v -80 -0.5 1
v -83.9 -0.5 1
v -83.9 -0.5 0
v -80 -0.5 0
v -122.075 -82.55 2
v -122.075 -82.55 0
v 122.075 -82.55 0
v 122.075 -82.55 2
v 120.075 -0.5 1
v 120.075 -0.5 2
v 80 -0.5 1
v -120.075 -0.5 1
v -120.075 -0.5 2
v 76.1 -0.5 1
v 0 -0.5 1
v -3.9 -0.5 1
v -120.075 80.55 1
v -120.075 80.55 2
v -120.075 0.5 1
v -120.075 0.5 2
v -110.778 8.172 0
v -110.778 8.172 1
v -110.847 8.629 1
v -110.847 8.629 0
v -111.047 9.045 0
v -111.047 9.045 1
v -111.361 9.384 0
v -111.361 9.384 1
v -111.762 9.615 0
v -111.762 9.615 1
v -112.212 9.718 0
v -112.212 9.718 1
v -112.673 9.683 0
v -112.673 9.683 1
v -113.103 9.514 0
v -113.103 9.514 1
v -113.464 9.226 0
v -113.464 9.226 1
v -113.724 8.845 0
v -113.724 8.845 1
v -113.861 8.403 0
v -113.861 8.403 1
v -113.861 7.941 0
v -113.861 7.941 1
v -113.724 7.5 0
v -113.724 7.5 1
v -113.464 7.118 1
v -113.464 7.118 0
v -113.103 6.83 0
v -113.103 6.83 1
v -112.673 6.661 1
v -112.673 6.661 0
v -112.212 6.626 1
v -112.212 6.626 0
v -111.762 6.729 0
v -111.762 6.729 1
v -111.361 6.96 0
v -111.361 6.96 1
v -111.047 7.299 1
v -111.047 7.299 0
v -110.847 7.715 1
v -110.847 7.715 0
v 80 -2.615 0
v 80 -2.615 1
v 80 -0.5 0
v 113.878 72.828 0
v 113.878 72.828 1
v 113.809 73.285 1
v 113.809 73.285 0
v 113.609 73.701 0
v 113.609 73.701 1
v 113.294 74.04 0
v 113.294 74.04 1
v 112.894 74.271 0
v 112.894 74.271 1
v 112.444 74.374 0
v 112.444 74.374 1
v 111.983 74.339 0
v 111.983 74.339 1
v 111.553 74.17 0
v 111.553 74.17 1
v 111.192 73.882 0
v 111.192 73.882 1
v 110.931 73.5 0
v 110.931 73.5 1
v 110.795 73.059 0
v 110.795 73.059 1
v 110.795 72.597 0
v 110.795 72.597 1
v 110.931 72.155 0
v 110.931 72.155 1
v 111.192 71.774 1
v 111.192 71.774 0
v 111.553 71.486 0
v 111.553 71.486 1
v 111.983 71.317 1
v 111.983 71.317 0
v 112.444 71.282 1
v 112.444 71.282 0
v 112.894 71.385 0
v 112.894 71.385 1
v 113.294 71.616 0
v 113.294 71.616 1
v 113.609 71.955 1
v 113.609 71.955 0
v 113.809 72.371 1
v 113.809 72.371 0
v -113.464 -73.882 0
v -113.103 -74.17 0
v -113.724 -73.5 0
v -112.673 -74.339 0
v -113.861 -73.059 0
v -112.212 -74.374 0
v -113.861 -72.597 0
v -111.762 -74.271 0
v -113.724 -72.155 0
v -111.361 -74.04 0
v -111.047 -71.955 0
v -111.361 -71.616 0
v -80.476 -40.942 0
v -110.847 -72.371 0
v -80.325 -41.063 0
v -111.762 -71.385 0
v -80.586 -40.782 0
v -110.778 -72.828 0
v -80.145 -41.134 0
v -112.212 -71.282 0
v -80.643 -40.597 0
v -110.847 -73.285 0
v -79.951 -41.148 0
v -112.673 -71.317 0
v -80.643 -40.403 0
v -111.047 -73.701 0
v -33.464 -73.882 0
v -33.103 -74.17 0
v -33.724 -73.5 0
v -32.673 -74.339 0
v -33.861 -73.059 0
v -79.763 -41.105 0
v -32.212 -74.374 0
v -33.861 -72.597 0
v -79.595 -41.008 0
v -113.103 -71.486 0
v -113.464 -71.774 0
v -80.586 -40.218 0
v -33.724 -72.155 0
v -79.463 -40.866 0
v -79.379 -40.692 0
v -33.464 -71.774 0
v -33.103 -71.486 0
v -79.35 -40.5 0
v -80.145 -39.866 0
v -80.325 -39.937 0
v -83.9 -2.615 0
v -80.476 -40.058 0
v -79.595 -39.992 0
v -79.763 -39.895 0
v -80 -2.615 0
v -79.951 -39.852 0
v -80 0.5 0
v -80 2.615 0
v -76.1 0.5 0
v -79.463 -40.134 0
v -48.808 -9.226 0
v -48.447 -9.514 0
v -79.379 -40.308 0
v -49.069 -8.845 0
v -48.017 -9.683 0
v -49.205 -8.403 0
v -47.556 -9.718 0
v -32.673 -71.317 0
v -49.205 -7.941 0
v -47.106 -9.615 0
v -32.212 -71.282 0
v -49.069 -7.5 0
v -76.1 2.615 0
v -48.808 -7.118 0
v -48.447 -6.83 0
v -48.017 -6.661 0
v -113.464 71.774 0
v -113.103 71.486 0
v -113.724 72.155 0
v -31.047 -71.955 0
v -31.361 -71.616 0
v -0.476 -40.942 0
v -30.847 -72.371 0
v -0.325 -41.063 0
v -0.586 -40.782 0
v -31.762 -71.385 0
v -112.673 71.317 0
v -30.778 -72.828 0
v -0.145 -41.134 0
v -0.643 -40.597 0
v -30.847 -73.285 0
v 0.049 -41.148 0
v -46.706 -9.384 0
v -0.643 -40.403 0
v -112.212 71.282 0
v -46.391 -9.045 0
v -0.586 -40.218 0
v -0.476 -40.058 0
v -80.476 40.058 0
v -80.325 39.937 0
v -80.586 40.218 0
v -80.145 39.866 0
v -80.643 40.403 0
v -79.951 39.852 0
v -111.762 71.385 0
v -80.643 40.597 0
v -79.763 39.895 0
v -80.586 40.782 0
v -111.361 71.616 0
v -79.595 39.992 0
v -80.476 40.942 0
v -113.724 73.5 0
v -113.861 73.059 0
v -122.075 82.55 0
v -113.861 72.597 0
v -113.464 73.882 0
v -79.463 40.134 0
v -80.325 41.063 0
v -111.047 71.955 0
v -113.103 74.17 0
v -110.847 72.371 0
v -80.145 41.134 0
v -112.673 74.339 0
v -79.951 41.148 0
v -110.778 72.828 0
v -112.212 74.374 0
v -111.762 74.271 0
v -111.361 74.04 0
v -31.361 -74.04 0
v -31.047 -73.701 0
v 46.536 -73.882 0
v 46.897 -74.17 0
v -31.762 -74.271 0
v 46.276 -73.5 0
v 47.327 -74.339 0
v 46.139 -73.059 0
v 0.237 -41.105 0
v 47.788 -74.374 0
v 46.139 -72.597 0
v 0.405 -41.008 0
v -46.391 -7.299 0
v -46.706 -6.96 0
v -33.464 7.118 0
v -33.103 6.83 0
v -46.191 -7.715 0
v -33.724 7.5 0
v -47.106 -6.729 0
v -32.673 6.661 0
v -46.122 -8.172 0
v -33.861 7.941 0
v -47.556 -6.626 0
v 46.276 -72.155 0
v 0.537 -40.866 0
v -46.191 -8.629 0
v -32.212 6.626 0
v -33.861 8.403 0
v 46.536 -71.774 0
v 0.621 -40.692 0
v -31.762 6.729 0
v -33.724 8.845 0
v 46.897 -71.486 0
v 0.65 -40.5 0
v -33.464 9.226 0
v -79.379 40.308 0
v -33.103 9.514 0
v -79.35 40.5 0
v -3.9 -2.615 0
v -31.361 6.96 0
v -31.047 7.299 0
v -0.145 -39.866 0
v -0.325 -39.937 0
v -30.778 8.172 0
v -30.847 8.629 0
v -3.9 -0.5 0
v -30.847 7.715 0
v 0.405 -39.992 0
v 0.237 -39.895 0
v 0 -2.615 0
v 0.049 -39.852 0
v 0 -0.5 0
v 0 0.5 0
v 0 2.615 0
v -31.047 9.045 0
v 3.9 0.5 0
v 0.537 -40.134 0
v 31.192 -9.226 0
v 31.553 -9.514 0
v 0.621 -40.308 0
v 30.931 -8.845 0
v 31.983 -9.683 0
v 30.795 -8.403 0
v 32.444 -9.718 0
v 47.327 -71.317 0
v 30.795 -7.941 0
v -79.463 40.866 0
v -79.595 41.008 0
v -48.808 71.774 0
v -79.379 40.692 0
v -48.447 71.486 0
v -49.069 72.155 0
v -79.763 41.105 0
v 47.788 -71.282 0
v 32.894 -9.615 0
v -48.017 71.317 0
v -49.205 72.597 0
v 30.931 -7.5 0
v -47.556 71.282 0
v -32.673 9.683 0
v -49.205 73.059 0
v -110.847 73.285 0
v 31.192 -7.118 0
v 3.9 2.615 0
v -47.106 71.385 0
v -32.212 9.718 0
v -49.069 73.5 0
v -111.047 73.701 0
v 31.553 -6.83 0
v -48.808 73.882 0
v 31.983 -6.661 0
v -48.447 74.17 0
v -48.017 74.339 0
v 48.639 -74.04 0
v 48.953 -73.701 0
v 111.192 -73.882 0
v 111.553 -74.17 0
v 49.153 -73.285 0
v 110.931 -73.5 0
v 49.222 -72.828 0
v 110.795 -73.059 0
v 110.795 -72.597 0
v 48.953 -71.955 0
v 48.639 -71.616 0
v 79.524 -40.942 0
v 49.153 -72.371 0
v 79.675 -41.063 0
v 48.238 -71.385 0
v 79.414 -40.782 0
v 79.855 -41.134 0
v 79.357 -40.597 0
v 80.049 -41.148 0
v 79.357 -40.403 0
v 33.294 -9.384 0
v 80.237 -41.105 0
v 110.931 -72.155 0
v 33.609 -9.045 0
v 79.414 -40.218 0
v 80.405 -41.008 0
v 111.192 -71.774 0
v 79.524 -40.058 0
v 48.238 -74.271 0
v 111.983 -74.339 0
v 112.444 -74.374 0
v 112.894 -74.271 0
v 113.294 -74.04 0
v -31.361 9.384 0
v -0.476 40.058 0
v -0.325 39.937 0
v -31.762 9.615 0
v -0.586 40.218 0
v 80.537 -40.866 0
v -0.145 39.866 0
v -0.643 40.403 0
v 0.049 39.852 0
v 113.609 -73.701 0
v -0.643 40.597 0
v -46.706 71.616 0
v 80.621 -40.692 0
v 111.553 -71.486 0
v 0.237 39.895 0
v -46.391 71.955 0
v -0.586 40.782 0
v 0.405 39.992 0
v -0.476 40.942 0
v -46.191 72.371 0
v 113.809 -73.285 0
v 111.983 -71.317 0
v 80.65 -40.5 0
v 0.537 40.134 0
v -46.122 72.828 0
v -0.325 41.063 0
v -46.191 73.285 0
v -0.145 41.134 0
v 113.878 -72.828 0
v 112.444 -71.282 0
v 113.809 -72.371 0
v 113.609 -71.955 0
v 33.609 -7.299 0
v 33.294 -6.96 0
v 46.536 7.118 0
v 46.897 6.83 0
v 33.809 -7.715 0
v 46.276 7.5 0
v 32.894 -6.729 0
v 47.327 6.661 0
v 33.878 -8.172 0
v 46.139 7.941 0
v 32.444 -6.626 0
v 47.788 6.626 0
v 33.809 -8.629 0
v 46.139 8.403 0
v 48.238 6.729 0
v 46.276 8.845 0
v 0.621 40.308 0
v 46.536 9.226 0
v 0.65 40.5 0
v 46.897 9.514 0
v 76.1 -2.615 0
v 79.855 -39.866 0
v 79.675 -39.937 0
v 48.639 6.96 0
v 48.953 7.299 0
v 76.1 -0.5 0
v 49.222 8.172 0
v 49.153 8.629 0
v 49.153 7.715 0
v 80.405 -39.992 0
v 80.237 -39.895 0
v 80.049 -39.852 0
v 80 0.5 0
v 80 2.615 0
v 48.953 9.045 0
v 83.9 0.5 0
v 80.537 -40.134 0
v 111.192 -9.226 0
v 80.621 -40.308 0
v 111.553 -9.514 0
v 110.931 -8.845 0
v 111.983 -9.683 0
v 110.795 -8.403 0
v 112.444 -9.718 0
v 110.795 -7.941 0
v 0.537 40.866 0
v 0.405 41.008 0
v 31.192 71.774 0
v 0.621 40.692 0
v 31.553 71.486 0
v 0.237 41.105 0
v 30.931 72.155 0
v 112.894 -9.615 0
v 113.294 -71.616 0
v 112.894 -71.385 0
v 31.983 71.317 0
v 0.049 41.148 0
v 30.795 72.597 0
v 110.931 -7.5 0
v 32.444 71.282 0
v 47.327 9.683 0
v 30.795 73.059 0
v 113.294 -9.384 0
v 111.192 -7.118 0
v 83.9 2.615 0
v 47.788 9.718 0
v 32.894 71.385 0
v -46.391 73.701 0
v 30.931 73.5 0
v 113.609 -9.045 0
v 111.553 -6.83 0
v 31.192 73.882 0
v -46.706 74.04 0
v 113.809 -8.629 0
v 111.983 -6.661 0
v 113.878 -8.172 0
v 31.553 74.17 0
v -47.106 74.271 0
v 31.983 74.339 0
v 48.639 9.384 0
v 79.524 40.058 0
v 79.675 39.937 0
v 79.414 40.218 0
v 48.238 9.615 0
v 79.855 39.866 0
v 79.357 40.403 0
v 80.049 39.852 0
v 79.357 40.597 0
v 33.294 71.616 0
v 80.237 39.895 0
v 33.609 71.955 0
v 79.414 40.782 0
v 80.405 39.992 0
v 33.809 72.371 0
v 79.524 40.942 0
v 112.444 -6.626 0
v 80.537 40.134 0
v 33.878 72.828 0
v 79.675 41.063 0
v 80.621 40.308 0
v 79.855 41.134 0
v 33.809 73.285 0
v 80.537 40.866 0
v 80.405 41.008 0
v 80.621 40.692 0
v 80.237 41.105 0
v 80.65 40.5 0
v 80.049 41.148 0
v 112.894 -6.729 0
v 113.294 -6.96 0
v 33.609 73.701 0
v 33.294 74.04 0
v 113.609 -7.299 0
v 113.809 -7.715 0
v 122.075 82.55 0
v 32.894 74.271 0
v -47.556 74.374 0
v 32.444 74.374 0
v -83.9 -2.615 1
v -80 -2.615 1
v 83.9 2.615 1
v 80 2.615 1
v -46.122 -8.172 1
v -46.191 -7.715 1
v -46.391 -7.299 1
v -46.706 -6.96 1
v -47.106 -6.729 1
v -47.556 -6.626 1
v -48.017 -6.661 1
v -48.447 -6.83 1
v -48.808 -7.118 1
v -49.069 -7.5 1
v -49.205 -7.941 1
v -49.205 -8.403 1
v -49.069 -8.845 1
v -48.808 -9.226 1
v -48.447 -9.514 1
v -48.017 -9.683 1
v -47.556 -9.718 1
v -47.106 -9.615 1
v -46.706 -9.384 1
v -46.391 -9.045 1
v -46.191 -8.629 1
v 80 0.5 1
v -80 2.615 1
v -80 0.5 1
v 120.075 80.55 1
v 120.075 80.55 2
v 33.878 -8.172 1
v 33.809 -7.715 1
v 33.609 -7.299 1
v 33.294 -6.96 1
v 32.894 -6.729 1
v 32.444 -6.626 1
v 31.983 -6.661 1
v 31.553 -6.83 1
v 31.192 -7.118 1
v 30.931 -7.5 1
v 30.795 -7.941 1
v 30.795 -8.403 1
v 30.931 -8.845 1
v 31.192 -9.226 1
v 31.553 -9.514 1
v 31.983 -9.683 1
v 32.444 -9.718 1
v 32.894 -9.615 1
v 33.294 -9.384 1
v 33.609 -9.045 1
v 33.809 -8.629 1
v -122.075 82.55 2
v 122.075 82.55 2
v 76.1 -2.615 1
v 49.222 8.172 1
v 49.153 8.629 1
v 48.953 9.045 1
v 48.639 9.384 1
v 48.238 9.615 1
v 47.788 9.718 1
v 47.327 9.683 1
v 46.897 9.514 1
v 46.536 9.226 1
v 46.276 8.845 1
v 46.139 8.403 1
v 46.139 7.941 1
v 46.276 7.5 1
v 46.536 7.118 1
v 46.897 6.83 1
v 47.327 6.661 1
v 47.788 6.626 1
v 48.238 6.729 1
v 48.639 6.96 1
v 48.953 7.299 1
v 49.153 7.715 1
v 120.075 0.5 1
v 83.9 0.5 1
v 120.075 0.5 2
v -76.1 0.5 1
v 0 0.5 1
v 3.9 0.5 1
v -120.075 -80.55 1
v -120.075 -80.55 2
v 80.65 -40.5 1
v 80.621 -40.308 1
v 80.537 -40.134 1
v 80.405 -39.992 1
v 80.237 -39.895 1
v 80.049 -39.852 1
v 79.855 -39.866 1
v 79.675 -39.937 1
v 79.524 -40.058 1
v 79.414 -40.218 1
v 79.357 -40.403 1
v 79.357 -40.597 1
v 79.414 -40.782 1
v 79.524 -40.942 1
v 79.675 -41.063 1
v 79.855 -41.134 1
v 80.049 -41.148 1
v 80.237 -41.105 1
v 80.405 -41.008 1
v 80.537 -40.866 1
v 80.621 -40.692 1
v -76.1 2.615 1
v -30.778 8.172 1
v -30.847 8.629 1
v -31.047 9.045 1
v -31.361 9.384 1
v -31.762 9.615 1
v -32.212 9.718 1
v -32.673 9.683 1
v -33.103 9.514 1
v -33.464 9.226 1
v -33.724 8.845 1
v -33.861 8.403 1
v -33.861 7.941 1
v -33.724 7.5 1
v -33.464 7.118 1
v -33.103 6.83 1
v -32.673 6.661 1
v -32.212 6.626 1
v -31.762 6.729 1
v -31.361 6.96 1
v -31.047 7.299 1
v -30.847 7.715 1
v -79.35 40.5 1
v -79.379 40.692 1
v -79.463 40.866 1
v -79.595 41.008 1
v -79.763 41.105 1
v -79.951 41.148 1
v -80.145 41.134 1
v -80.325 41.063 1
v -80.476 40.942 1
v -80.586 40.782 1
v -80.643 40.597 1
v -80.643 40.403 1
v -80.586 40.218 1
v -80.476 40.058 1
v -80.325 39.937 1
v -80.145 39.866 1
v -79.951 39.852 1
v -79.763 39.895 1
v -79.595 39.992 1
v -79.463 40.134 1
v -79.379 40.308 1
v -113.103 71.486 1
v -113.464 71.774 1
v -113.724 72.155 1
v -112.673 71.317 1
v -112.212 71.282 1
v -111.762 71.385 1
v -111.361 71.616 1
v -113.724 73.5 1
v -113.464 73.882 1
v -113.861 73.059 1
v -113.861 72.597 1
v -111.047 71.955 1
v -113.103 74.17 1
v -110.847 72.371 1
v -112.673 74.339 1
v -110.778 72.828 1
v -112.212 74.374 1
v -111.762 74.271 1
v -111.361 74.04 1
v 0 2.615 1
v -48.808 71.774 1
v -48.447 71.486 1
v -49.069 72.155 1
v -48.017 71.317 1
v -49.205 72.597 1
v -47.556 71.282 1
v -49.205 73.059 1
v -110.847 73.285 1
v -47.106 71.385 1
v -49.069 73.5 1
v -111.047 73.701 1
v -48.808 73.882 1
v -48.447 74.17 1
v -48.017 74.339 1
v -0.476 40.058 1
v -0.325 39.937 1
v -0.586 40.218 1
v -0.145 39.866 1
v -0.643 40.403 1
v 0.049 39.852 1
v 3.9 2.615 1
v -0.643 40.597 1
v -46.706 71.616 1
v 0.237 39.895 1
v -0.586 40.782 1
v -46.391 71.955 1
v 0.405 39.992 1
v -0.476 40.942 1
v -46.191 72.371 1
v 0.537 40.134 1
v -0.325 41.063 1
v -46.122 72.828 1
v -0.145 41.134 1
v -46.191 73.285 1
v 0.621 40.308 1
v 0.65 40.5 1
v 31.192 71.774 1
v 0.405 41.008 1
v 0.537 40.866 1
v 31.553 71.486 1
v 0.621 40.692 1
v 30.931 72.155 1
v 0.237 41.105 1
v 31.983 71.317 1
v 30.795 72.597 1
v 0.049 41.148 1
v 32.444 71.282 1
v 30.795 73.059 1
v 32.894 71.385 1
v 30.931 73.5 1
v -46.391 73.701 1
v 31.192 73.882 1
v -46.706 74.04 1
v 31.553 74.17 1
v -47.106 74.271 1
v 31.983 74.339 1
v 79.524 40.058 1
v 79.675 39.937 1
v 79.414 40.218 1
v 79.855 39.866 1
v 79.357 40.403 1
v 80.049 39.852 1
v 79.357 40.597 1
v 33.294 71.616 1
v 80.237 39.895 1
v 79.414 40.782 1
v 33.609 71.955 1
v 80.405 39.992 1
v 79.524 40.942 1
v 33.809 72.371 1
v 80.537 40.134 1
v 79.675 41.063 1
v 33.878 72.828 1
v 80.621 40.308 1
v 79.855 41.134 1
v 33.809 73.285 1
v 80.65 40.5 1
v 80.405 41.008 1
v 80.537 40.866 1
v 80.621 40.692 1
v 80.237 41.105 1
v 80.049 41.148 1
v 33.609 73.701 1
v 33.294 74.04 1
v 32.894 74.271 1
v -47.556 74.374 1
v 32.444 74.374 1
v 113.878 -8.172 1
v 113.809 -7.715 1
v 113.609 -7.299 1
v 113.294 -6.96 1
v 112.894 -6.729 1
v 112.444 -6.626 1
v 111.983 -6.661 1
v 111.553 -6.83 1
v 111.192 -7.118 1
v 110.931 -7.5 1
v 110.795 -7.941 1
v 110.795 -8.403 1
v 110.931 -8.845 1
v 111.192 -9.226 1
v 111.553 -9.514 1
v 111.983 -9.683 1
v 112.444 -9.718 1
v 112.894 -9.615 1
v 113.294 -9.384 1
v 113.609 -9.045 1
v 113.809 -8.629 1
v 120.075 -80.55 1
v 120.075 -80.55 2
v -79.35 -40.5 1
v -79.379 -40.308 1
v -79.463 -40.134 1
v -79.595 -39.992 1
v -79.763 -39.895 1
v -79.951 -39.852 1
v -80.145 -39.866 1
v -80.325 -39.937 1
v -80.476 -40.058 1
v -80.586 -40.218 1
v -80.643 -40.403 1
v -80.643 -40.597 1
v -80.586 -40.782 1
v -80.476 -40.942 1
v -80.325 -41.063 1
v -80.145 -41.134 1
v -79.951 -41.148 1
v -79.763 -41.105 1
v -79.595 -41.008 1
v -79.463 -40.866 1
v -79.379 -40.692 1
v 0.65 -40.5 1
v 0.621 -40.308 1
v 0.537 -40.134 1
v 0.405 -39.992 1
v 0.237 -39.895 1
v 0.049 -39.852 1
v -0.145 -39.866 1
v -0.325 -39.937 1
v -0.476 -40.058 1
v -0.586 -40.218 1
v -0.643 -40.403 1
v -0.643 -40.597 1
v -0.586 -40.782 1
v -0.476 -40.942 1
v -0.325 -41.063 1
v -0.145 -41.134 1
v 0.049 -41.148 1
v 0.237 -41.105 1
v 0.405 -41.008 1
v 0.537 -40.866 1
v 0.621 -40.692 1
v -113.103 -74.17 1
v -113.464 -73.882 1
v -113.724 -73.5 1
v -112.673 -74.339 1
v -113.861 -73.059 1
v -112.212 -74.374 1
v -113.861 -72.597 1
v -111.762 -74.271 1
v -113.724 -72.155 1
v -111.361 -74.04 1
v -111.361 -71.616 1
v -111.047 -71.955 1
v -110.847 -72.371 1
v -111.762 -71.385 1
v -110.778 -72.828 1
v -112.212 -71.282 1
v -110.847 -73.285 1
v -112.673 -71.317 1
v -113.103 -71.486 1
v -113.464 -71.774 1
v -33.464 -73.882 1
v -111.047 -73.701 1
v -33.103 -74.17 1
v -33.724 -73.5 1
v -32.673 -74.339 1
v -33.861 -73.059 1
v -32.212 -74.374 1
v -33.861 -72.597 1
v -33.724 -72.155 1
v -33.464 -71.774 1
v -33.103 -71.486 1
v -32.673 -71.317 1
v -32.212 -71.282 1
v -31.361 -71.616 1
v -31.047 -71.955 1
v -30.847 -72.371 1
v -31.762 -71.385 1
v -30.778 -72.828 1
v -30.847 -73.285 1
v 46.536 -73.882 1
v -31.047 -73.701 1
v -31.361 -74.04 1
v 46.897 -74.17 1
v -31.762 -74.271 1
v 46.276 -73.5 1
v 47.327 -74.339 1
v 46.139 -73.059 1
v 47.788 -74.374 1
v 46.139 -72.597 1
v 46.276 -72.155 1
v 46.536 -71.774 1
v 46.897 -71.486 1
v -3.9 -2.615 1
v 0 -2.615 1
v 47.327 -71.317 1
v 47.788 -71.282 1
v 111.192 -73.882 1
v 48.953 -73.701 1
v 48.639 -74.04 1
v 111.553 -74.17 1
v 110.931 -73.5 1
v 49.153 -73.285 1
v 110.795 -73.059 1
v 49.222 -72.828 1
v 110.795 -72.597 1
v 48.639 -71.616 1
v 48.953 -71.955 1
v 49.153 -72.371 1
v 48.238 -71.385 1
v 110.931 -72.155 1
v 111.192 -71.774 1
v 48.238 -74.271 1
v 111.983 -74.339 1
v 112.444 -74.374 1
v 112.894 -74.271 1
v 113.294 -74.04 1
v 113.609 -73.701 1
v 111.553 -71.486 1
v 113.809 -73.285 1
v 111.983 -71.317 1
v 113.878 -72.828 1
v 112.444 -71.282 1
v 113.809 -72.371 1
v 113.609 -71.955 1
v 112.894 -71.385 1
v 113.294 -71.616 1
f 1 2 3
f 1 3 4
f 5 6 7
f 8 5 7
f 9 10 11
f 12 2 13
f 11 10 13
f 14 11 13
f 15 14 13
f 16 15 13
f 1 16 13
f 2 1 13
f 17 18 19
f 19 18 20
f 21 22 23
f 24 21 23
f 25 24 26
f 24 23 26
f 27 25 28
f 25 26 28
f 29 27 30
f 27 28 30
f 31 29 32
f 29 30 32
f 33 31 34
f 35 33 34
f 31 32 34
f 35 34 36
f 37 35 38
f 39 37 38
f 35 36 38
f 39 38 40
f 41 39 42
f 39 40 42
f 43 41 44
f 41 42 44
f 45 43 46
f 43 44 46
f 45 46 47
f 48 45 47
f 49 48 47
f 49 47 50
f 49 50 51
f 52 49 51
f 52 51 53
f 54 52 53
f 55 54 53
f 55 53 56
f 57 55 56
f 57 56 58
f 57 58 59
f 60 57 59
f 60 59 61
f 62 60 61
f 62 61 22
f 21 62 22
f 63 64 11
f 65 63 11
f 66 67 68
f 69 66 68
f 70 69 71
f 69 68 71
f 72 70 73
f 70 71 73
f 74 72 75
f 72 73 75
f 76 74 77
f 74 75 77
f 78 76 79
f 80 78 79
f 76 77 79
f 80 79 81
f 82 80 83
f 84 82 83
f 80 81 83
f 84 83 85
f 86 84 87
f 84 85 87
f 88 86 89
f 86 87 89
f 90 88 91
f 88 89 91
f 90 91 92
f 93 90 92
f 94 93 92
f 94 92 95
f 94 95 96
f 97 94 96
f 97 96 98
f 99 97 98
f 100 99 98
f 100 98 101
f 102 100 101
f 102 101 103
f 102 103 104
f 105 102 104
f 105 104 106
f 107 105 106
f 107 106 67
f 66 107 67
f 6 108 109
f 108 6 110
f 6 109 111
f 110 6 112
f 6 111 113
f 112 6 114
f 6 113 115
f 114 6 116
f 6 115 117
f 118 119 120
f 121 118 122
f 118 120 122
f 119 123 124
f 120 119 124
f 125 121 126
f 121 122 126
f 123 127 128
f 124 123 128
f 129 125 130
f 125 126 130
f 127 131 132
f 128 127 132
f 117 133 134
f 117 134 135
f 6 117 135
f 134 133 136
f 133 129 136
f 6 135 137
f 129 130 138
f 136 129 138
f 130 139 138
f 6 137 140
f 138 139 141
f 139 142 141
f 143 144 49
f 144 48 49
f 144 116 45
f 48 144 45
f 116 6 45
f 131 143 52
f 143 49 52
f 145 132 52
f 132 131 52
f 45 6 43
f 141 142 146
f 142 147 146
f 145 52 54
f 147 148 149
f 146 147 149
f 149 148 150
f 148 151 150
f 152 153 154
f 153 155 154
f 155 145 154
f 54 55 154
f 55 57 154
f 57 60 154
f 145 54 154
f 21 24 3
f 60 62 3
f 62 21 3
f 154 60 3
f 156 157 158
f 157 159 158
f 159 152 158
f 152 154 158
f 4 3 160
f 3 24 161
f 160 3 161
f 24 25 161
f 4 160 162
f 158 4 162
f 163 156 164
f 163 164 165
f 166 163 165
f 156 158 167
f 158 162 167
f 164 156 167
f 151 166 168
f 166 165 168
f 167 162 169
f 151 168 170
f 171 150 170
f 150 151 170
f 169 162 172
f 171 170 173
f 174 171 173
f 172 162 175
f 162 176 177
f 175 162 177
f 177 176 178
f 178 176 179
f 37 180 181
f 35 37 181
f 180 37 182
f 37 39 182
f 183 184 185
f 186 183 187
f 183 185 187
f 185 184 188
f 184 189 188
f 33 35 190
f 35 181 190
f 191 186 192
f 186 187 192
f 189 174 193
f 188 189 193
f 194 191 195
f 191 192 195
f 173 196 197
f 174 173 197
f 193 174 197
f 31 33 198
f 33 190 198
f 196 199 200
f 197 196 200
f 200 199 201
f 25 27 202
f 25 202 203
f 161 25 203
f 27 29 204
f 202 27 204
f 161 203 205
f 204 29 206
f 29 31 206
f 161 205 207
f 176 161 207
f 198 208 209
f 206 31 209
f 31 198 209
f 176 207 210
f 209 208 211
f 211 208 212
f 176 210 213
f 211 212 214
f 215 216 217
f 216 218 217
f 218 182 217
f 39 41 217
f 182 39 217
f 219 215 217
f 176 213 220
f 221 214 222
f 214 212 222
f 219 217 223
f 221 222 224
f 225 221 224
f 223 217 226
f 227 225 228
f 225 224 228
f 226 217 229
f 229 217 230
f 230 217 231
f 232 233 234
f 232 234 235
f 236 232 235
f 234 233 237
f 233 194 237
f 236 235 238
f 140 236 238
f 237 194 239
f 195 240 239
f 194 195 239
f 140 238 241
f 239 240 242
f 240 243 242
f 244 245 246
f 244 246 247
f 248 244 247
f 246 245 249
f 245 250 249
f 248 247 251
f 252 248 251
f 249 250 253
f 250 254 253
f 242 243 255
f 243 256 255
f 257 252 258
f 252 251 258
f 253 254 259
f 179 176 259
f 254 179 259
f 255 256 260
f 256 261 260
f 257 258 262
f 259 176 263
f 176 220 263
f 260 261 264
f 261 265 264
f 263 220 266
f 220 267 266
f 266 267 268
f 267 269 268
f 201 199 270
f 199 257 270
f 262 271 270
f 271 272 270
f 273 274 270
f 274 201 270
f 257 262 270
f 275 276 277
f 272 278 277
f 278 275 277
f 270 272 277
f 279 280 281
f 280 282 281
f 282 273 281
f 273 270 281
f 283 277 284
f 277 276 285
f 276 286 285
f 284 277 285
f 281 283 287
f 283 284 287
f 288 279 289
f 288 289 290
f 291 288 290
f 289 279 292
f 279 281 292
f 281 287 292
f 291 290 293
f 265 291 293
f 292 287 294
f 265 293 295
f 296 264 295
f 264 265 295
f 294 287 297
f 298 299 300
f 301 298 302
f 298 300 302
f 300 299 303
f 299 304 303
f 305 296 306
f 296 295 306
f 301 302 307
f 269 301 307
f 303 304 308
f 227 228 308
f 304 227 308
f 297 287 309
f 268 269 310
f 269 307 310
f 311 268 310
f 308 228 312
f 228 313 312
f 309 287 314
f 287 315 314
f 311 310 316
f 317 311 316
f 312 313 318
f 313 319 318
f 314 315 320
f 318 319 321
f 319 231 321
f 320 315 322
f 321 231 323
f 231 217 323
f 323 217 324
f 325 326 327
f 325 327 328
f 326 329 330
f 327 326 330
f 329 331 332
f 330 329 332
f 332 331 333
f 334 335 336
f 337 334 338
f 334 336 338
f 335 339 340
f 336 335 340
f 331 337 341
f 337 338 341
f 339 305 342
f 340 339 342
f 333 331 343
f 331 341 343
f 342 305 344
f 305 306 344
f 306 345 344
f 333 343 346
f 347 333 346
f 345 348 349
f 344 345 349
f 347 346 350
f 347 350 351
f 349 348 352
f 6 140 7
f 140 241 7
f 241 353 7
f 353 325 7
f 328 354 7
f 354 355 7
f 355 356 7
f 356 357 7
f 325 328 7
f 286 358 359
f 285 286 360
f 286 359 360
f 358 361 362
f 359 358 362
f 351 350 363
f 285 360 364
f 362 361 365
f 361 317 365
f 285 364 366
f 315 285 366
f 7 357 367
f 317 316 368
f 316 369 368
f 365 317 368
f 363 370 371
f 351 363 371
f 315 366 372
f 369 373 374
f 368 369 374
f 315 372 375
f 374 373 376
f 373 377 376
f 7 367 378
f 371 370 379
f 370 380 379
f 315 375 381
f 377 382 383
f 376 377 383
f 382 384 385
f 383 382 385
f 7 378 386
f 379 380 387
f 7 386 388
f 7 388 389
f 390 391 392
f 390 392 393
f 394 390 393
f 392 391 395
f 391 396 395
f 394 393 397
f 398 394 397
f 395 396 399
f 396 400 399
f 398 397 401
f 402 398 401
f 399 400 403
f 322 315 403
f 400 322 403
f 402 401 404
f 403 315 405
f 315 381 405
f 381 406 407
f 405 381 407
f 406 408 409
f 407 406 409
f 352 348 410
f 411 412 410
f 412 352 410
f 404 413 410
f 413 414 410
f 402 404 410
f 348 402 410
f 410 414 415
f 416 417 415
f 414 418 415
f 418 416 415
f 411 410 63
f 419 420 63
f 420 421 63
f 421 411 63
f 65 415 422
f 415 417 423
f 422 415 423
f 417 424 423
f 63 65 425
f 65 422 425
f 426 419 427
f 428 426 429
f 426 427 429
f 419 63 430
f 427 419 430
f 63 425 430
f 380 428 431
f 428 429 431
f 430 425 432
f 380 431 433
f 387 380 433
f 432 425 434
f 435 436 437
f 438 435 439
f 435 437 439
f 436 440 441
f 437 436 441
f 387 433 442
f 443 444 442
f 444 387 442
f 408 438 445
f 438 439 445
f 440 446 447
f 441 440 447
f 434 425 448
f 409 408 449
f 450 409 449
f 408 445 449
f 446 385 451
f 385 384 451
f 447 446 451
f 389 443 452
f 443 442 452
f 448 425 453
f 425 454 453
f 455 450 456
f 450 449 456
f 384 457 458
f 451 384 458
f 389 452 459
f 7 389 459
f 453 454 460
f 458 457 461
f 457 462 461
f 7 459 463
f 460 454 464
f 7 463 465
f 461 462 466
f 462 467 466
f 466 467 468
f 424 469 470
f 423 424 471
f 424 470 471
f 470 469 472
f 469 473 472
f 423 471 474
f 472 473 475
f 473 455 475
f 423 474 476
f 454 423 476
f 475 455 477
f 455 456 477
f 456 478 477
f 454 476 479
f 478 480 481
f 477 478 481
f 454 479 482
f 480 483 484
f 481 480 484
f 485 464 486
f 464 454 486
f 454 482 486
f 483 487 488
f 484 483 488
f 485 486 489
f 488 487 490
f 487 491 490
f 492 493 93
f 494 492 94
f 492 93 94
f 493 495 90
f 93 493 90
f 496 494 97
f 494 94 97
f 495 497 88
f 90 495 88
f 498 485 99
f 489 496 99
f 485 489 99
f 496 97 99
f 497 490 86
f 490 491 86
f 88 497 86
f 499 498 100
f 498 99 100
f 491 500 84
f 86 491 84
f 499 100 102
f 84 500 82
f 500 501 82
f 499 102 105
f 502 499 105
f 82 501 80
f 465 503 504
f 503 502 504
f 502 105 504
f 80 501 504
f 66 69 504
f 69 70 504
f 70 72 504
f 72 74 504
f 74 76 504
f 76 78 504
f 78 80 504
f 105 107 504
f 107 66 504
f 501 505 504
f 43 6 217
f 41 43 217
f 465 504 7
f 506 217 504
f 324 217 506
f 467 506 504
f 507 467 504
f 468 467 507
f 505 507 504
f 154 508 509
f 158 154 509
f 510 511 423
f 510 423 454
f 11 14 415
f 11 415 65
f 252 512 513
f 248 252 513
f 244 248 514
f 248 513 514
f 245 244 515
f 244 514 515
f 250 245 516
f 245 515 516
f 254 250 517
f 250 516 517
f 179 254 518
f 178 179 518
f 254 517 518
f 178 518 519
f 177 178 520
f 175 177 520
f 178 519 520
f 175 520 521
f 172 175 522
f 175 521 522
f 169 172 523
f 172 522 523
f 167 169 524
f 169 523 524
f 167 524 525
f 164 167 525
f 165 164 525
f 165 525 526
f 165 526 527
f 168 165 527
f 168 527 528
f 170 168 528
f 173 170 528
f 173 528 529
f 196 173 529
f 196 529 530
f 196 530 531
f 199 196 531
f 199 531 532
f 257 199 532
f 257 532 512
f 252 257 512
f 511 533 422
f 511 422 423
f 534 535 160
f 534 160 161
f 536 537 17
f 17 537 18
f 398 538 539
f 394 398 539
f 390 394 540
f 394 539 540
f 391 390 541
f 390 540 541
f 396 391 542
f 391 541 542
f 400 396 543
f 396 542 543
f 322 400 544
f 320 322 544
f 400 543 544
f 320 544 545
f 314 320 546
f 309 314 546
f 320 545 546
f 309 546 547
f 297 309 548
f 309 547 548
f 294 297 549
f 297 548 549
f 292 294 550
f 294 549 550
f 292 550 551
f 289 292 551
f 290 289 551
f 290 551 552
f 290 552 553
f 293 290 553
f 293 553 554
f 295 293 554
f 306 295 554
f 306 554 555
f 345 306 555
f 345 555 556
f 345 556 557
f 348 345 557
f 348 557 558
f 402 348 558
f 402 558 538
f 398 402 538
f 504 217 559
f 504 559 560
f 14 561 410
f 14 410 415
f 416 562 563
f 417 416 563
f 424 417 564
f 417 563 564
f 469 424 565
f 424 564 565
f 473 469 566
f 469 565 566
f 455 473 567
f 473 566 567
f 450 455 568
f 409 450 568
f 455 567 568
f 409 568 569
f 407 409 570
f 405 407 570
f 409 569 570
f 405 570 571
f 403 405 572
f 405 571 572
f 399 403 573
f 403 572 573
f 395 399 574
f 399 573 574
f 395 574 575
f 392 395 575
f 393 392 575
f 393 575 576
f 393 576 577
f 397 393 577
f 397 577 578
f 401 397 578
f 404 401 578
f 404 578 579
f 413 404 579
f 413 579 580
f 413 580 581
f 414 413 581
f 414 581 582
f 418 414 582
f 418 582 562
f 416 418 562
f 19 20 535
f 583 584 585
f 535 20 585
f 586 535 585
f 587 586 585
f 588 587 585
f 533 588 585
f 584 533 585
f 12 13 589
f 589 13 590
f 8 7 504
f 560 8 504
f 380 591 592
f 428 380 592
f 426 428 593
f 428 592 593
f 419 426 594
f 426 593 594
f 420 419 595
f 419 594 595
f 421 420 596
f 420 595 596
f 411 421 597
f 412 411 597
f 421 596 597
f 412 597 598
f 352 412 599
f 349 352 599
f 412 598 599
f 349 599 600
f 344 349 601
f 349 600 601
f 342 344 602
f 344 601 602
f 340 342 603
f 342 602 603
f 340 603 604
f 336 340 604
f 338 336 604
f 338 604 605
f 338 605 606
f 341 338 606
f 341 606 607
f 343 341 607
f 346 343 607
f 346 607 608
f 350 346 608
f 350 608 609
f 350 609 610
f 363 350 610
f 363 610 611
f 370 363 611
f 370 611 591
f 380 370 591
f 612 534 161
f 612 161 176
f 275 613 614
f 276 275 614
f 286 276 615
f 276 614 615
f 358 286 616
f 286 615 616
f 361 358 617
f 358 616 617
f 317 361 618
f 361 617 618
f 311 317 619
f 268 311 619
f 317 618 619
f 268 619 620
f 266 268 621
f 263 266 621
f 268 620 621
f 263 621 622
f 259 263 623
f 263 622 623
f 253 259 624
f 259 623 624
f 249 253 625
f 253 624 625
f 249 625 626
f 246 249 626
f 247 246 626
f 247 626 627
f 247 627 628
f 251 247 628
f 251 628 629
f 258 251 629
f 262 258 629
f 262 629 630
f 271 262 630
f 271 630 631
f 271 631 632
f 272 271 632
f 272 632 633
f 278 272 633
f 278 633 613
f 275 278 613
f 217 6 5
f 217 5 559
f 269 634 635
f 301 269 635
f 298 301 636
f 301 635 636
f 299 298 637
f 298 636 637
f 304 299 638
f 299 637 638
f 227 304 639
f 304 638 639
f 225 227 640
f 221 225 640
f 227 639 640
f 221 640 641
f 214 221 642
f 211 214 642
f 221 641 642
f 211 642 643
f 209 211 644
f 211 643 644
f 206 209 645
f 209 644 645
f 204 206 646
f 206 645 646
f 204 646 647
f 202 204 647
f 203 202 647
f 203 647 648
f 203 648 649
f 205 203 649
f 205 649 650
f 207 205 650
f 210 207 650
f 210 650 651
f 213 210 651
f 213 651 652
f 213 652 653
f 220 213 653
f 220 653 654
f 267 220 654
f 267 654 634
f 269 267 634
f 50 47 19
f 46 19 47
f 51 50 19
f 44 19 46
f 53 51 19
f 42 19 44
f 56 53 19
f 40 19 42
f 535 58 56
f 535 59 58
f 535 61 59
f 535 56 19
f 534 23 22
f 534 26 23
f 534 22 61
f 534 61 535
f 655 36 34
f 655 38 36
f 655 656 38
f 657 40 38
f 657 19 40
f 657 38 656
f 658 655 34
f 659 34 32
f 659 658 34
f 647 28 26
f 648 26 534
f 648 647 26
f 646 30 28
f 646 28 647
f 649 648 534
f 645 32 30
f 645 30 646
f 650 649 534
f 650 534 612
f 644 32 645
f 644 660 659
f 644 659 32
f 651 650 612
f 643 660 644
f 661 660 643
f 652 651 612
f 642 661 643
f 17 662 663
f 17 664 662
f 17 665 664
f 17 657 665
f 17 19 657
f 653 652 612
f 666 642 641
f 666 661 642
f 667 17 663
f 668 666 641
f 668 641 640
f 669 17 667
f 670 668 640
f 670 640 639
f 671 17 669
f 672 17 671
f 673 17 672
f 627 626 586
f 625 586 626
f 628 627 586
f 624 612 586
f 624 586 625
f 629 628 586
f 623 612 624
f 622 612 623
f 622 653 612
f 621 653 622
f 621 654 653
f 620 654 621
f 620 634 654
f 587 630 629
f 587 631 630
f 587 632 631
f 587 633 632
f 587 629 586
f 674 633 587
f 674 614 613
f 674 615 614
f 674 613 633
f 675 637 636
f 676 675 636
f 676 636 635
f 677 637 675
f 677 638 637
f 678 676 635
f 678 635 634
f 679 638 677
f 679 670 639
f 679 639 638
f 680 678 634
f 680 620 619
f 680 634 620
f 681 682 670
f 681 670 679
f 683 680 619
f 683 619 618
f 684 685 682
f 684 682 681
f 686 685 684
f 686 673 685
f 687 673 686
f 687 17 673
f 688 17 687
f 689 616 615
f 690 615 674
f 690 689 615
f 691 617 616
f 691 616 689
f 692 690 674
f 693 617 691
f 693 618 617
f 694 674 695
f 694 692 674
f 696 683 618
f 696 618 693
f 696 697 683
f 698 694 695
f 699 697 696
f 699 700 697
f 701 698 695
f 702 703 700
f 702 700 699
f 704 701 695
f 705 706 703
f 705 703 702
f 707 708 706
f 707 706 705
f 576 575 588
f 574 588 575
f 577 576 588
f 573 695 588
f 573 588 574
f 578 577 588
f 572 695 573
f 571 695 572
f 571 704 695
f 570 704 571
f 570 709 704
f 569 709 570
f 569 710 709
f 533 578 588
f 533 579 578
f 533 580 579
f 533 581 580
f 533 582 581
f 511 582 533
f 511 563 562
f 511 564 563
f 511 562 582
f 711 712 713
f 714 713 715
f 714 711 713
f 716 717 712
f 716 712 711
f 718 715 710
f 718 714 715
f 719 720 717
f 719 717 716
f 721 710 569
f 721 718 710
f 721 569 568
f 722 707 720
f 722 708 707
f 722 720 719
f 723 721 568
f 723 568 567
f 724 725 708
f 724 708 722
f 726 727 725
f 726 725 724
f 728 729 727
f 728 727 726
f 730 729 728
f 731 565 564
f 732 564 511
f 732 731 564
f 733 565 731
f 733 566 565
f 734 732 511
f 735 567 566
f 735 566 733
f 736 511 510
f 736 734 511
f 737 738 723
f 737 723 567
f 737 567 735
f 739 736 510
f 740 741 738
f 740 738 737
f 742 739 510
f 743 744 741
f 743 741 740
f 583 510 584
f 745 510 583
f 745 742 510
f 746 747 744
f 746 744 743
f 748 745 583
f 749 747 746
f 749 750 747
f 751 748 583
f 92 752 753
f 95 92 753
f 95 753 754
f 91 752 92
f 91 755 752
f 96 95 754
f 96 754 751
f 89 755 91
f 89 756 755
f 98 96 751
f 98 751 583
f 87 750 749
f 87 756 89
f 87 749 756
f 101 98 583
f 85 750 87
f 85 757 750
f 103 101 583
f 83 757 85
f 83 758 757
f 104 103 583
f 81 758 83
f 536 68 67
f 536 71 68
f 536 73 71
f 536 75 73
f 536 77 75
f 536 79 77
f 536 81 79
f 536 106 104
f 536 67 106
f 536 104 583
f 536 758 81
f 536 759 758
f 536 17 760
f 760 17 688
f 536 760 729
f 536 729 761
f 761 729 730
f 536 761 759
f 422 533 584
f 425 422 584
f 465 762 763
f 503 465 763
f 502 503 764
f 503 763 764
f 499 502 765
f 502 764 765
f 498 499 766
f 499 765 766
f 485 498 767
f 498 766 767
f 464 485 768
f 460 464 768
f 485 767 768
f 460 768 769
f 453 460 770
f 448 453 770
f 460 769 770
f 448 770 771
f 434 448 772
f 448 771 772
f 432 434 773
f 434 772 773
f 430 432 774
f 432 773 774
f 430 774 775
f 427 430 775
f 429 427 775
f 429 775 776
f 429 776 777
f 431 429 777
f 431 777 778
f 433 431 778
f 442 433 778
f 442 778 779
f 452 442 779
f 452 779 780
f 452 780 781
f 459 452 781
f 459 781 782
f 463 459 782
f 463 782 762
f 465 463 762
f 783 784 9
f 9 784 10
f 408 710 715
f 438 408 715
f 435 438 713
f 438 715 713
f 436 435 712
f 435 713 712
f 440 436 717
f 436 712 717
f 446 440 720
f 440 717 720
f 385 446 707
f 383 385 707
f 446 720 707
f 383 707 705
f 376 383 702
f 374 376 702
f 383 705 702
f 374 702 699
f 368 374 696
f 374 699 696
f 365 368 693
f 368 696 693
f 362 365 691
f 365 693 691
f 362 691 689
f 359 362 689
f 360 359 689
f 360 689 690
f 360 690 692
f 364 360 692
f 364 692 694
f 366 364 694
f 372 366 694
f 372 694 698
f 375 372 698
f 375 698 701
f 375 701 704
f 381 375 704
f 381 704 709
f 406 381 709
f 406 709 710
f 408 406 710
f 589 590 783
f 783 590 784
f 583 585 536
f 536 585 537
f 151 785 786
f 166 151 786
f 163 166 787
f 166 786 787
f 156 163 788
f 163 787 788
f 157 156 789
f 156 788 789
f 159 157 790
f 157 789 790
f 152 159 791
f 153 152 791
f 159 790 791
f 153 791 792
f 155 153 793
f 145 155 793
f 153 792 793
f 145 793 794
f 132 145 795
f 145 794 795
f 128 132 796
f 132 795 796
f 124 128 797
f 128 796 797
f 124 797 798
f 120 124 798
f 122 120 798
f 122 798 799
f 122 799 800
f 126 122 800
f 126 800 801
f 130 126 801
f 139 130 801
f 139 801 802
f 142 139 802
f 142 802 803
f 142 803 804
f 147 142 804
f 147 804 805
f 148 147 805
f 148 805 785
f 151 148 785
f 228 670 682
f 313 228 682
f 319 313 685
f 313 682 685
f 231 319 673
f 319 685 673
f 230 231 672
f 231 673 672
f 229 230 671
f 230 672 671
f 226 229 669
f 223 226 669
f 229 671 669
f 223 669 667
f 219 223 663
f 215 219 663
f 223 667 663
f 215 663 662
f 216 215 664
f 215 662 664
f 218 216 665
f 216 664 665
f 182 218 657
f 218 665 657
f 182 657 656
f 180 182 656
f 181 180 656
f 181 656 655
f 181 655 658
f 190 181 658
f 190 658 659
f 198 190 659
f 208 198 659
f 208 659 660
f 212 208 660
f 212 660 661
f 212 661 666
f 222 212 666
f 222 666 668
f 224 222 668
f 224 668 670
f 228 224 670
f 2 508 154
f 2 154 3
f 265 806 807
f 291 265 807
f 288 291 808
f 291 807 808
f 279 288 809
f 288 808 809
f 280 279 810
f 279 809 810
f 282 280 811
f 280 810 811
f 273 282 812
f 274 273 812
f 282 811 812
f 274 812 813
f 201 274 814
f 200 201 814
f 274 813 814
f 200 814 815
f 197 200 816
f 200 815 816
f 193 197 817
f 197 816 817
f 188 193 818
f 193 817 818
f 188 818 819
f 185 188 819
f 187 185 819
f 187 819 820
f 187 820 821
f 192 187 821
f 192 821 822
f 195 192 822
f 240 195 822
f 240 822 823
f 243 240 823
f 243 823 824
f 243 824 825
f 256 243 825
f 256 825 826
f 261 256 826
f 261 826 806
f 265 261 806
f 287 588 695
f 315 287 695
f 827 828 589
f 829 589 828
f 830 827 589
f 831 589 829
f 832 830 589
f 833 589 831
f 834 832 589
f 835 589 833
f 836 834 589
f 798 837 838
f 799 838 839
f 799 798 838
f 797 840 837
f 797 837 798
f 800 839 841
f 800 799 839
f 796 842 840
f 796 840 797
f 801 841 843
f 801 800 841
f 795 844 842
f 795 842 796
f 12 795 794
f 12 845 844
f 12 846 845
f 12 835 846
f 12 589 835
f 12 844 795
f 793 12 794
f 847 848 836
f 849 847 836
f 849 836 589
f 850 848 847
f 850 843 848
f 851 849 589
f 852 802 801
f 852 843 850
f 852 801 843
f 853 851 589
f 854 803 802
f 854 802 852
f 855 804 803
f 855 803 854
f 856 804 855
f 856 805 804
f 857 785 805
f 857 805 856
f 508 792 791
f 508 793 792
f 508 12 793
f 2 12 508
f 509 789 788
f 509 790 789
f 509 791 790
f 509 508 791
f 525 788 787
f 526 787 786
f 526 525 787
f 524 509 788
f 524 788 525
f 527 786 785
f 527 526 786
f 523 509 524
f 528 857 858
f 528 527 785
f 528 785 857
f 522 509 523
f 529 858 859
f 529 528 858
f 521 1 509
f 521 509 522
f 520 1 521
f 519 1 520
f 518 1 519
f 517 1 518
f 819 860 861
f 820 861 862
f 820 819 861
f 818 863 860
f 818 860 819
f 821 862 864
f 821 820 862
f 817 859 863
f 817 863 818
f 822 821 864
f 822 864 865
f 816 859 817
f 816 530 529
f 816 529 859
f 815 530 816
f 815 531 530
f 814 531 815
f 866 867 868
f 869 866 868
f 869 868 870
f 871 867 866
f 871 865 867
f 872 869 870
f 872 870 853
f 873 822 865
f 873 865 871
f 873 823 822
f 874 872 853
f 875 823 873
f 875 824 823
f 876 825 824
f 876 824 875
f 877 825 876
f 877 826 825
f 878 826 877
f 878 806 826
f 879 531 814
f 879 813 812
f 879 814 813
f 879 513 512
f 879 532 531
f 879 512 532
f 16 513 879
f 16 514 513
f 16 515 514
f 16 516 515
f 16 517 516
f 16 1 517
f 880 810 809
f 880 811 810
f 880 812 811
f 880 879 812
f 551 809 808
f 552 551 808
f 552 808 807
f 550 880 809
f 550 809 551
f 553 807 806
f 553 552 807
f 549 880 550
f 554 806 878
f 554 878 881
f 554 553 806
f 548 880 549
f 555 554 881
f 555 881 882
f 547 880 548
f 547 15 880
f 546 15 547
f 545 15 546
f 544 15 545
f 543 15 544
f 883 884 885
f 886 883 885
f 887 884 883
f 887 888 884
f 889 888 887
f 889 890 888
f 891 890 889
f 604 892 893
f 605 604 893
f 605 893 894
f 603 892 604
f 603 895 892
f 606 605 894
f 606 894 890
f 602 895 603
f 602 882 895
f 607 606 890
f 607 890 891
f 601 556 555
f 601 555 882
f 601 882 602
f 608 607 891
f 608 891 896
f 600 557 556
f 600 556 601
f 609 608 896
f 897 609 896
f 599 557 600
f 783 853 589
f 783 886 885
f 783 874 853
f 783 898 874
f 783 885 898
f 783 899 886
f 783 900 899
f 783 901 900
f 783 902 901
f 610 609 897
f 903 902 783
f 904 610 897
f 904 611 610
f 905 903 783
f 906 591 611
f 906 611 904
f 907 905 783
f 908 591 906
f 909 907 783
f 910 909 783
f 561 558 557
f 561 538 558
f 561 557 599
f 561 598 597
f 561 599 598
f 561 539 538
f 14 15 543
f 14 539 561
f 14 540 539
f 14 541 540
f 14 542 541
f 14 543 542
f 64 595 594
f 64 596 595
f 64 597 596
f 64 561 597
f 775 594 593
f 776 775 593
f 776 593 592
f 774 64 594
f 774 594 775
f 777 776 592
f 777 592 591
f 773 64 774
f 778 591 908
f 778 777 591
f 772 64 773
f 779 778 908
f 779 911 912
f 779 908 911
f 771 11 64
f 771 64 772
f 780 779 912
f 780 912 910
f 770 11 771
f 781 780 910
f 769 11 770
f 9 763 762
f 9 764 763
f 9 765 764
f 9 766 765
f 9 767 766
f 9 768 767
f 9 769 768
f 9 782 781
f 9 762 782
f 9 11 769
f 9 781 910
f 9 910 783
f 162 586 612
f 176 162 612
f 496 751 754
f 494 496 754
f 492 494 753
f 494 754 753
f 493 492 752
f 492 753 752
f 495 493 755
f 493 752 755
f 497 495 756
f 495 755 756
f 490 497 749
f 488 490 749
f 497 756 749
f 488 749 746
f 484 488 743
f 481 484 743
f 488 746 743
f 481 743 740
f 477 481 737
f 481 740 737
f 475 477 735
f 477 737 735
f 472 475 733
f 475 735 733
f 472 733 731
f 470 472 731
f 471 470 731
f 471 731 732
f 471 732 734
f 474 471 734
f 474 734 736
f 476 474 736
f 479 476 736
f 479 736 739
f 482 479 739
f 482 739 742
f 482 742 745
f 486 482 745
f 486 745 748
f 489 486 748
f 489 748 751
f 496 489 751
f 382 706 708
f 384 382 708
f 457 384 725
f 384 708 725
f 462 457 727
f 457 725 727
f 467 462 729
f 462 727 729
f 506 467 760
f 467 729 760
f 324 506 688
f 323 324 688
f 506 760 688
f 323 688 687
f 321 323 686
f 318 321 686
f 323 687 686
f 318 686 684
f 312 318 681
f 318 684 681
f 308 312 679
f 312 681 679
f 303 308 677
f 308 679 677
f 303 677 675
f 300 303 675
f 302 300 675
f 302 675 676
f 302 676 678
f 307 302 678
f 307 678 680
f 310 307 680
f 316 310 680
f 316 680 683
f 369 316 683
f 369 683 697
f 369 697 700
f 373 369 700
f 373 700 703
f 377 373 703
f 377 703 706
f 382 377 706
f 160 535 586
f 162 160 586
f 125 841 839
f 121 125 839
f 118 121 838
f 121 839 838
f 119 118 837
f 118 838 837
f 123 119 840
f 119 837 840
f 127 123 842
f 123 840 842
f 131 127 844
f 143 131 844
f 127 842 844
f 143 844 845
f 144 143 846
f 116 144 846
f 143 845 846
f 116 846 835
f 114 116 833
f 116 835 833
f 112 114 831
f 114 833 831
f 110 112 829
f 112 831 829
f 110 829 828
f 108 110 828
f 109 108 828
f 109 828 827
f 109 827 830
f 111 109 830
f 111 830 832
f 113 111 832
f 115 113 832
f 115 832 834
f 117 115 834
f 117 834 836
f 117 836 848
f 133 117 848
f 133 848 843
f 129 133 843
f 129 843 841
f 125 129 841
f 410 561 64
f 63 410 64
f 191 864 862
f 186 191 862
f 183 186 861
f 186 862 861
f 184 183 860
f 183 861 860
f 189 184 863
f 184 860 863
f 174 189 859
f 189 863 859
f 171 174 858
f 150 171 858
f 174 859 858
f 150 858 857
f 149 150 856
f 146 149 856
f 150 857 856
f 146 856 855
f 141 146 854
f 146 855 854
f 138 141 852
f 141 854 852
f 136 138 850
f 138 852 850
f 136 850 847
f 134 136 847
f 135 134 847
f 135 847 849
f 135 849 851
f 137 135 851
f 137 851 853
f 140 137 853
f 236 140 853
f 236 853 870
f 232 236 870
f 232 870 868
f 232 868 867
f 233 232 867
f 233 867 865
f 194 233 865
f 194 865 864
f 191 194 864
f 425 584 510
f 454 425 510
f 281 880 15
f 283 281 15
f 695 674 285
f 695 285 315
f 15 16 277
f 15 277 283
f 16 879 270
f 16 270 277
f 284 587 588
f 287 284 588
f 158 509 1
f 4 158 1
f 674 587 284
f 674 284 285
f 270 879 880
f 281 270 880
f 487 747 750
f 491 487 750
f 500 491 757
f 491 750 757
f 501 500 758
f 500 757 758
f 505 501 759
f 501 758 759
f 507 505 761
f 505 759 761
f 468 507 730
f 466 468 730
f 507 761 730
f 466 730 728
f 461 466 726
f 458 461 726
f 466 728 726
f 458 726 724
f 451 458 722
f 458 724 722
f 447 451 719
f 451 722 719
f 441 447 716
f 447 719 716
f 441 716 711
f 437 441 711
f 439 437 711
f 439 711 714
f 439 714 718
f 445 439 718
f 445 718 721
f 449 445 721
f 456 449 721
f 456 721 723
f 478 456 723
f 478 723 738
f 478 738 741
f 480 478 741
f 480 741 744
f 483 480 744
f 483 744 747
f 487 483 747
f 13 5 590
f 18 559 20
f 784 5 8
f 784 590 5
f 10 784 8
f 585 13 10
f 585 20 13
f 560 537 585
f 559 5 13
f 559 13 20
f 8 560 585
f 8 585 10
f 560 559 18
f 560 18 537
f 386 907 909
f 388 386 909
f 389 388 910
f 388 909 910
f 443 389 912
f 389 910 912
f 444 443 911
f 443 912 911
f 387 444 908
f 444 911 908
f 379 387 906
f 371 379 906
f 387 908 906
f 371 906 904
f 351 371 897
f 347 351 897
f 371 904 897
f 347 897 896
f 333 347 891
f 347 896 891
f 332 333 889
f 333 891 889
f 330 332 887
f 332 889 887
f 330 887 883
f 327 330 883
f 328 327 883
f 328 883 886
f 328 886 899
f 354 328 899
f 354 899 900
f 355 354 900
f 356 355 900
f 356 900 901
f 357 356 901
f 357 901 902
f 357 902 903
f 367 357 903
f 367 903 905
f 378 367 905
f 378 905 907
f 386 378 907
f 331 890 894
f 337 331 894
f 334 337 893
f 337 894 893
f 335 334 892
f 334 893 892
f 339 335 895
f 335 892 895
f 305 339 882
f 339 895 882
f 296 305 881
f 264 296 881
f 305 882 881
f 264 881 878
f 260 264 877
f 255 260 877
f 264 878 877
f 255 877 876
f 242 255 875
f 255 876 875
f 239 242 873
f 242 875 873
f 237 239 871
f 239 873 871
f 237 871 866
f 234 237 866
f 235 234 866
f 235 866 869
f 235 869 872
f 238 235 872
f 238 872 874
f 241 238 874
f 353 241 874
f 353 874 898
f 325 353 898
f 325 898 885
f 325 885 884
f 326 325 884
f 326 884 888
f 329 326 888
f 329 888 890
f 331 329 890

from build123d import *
from build123d import SkipClean  # not in build123d's __all__

# Parameters (mm, degrees)
F0_W     = 244.15
F0_H     = 165.1
F1_DEPTH = 2
F3_DEPTH = 1
F4_R     = 1.55
F4_R_2   = 0.65
F4_W     = 3.9
F4_H     = 2.115
F5_DEPTH = 1.001


with BuildPart() as f1:
    # F0 (on Top) → F1 (new body)
    with BuildSketch(Plane.XY):
        Rectangle(F0_W, F0_H)
    extrude(amount=F1_DEPTH)

    # F2 (on face) → F3 (cut)
    with BuildSketch(Plane.XY.offset(2)):
        Polygon((120.075, 80.55), (-120.075, 80.55), (-120.075, 1), (-120.075, 0.5), (120.075, 0.5), (120.075, 1), align=None)
        Polygon((-120.075, -80.55), (120.075, -80.55), (120.075, -1), (120.075, -0.5), (-120.075, -0.5), (-120.075, -1), align=None)
    extrude(amount=-F3_DEPTH, mode=Mode.SUBTRACT)

    # F4 (on face) → F5 (cut, through all)
    with BuildSketch(Plane.XY.offset(1)):
        with Locations((-47.6721085759, 72.8278914241)):
            Circle(F4_R)
        with Locations((32.3278905301, 72.8278914241)):
            Circle(F4_R)
        with Locations((112.3278914241, 72.8278914241)):
            Circle(F4_R)
        with Locations((-112.3278914241, 8.1721085759)):
            Circle(F4_R)
        with Locations((-32.3278914241, 8.1721085759)):
            Circle(F4_R)
        with Locations((47.6721076818, 8.1721085759)):
            Circle(F4_R)
        with Locations((-80, 40.5)):
            Circle(F4_R_2)
        with Locations((-4.47e-07, 40.5)):
            Circle(F4_R_2)
        with Locations((79.999999553, 40.5)):
            Circle(F4_R_2)
        with Locations((-112.3278914241, -72.8278914241)):
            Circle(F4_R)
        with Locations((-32.3278914241, -72.8278914241)):
            Circle(F4_R)
        with Locations((47.6721076818, -72.8278914241)):
            Circle(F4_R)
        with Locations((112.3278914241, -8.1721085759)):
            Circle(F4_R)
        with Locations((32.3278905301, -8.1721085759)):
            Circle(F4_R)
        with Locations((-47.6721085759, -8.1721085759)):
            Circle(F4_R)
        with Locations((-4.47e-07, -40.5)):
            Circle(F4_R_2)
        with Locations((79.999999553, -40.5)):
            Circle(F4_R_2)
        with Locations((112.3278914241, -72.8278914241)):
            Circle(F4_R)
        with Locations((-112.3278914241, 72.8278914241)):
            Circle(F4_R)
        with Locations((-80, -40.5)):
            Circle(F4_R_2)
        with Locations((-81.949996841, -1.5575)):
            Rectangle(F4_W, F4_H)
        with Locations((-78.0499982119, 1.5575)):
            Rectangle(F4_W, F4_H)
        with Locations((-1.9499991059, -1.5575001072)):
            Rectangle(F4_W, F4_H)
        with Locations((1.9499995232, 1.5575)):
            Rectangle(F4_W, F4_H)
        with Locations((78.0497357585, -1.5575)):
            Rectangle(F4_W, F4_H)
        with Locations((81.9497343876, 1.5575)):
            Rectangle(F4_W, F4_H)
    with SkipClean():  # cleaning this boolean's faces spoils the solid; the shape is the same uncleaned
        extrude(amount=-F5_DEPTH, mode=Mode.SUBTRACT)


solid = f1.part
